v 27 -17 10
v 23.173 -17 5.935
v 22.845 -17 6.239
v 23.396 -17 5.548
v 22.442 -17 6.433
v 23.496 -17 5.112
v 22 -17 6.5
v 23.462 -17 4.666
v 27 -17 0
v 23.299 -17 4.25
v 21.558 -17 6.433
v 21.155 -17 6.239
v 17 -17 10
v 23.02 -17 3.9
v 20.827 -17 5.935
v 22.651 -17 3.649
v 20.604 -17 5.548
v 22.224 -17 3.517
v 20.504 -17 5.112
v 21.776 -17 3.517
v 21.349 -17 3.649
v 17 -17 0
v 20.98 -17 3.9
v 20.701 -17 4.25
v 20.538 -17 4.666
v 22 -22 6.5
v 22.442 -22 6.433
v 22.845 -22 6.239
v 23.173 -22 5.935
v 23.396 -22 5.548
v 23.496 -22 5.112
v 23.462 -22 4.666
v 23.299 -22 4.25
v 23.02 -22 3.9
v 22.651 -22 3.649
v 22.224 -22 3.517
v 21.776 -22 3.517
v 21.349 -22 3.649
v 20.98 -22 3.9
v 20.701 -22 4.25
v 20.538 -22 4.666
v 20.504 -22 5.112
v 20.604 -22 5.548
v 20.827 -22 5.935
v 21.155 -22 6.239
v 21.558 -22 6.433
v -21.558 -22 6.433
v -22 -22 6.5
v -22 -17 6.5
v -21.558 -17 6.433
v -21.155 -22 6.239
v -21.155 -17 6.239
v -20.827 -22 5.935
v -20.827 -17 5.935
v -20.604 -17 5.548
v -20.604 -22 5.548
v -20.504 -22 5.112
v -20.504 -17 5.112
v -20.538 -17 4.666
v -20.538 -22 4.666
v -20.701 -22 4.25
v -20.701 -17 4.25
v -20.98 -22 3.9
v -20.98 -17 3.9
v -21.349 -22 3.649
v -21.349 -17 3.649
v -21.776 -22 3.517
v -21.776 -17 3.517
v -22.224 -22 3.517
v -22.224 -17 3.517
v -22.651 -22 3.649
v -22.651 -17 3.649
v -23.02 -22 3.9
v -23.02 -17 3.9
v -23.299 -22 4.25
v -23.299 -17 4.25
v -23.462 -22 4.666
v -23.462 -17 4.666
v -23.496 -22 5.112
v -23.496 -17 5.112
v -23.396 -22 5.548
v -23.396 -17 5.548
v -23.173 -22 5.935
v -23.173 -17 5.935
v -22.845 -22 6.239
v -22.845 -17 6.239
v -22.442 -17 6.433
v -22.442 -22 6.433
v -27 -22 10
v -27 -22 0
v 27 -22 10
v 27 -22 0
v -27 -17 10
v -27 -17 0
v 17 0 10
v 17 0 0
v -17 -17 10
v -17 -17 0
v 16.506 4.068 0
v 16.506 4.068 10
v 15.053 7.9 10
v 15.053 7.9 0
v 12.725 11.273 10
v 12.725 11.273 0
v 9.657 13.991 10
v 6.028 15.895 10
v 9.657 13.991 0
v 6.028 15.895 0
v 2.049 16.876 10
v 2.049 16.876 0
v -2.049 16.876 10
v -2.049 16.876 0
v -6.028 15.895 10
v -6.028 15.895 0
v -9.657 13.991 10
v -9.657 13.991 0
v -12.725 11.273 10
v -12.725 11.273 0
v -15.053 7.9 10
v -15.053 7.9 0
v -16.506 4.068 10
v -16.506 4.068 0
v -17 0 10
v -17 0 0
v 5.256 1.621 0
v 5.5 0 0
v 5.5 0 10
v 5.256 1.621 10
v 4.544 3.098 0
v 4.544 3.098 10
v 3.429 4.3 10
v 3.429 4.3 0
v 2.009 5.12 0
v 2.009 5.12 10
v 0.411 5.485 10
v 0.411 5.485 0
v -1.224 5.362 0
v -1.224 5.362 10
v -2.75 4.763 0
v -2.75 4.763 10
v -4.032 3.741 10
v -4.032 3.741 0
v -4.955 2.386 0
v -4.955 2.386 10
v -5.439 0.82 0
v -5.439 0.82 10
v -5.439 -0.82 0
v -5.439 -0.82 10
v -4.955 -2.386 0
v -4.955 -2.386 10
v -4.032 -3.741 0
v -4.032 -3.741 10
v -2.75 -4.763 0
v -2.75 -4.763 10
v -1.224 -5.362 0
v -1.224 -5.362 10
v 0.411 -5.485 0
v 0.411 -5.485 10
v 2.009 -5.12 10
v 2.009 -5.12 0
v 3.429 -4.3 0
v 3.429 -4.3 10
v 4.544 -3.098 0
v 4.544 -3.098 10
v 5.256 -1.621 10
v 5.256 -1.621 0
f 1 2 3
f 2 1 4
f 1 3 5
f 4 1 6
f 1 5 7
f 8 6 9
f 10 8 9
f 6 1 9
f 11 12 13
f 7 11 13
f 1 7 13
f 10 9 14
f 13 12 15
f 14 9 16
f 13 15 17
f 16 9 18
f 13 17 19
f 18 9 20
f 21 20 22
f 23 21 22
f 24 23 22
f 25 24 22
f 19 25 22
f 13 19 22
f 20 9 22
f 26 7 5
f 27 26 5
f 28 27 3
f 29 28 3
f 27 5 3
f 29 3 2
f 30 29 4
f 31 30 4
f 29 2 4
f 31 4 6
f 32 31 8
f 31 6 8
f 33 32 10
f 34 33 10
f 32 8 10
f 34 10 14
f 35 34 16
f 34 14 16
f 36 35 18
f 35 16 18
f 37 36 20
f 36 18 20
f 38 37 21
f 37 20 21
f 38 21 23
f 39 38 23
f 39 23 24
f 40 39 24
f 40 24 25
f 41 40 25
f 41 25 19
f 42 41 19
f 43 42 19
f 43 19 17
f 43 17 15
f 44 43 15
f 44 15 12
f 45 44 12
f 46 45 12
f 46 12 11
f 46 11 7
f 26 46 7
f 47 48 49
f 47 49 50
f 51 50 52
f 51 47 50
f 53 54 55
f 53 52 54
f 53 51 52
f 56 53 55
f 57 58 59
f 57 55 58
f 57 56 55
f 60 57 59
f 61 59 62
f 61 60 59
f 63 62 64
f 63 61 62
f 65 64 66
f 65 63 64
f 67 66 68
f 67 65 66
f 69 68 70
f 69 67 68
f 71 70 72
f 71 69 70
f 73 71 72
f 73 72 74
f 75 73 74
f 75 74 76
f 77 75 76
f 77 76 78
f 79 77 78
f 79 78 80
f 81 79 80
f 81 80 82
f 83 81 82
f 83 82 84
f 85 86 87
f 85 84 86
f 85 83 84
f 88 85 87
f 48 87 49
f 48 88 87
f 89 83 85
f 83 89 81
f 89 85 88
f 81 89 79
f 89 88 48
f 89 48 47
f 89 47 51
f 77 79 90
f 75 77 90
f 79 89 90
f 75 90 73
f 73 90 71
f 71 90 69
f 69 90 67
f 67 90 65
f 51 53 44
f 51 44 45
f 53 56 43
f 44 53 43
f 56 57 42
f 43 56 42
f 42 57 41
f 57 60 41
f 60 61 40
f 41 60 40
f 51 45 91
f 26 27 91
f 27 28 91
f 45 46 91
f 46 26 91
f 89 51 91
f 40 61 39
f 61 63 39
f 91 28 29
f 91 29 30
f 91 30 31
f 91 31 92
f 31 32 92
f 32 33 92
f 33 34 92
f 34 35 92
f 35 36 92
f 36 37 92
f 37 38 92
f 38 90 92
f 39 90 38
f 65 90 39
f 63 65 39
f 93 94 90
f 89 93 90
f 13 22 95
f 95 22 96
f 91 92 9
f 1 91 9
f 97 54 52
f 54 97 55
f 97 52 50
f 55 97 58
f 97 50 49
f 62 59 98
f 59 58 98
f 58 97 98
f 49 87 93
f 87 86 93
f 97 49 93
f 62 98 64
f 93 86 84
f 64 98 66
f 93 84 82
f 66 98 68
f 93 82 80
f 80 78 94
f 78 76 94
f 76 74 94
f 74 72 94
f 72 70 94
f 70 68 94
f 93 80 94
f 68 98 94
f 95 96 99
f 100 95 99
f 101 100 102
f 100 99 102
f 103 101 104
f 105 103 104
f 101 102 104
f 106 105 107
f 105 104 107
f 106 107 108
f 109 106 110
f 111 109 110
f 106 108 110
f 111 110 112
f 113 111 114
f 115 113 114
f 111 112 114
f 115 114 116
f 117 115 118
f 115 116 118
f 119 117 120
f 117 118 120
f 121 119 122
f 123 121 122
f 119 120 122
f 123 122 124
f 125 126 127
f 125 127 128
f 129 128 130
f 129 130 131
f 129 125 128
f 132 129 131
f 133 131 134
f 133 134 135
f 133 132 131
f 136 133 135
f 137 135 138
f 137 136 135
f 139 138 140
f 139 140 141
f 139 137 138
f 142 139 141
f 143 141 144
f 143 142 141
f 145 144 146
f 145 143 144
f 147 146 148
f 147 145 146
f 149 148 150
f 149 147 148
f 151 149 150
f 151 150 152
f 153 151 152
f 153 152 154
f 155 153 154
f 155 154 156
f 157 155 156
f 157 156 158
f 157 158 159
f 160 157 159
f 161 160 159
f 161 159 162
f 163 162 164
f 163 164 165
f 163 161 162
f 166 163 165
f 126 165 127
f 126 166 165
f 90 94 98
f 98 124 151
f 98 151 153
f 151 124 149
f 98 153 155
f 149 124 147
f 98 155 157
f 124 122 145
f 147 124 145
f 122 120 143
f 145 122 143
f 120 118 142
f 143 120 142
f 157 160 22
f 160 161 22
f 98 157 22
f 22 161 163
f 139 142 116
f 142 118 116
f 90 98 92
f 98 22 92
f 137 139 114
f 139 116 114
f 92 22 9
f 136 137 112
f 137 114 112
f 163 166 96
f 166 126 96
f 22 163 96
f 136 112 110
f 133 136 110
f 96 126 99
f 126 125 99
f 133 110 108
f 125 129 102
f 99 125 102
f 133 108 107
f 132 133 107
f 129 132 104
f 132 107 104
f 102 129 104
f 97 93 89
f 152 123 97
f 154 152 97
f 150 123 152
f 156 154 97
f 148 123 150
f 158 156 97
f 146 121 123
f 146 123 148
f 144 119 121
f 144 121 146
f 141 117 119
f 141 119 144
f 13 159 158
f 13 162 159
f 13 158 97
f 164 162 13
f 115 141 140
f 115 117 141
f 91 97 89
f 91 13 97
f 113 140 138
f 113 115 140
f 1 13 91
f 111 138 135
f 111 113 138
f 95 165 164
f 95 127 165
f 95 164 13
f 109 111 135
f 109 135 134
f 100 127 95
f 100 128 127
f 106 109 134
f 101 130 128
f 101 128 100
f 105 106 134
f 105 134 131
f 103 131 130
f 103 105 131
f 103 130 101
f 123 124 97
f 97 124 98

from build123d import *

# Parameters (mm, degrees)
SKETCH_3_R               = 5.5
EXTRUDE_1_DEPTH          = 10
SKETCH_4_R               = 1.5
CUT_EXTRUDE_1_DEPTH      = 45.55333882
CUT_EXTRUDE_2_DEPTH      = 45.55333882
CUT_EXTRUDE_2_DEPTH_BACK = 45.55333882
SKETCH_5_R               = 1.5


with BuildPart() as part:
    # Эскиз3 → Бобышка-Вытянуть1 (new body)
    with BuildSketch(Plane.XY):
        with BuildLine():
            Line((-17, 0), (-17, -17))
            Line((-17, -17), (-27, -17))
            Line((-27, -17), (-27, -22))
            Line((-27, -22), (27, -22))
            Line((27, -22), (27, -17))
            Line((27, -17), (17, -17))
            Line((17, -17), (17, 0))
            ThreePointArc((17, 0), (0, 17), (-17, 0))
        make_face()
        Circle(SKETCH_3_R, mode=Mode.SUBTRACT)
    extrude(amount=EXTRUDE_1_DEPTH)

    # Эскиз4 → Вырез-Вытянуть1 (cut, through all)
    with BuildSketch(Plane(origin=(0, -17, 0), x_dir=(1, 0, 0), z_dir=(0, 1, 0))):
        with Locations(Location((22, -5, 0), (0, 0, 270))):
            Circle(SKETCH_4_R)
    extrude(amount=-CUT_EXTRUDE_1_DEPTH, mode=Mode.SUBTRACT)

    # Эскиз5 → Вырез-Вытянуть2 (cut, two sides: drawn at the far end of the back side and taken through both)
    with BuildSketch(Plane(origin=(0, -17, 0), x_dir=(1, 0, 0), z_dir=(0, 1, 0)).offset(-CUT_EXTRUDE_2_DEPTH_BACK)):
        with Locations(Location((-22, -5, 0), (0, 0, 270))):
            Circle(SKETCH_5_R)
    extrude(amount=CUT_EXTRUDE_2_DEPTH + CUT_EXTRUDE_2_DEPTH_BACK, mode=Mode.SUBTRACT)


solid = part.part
